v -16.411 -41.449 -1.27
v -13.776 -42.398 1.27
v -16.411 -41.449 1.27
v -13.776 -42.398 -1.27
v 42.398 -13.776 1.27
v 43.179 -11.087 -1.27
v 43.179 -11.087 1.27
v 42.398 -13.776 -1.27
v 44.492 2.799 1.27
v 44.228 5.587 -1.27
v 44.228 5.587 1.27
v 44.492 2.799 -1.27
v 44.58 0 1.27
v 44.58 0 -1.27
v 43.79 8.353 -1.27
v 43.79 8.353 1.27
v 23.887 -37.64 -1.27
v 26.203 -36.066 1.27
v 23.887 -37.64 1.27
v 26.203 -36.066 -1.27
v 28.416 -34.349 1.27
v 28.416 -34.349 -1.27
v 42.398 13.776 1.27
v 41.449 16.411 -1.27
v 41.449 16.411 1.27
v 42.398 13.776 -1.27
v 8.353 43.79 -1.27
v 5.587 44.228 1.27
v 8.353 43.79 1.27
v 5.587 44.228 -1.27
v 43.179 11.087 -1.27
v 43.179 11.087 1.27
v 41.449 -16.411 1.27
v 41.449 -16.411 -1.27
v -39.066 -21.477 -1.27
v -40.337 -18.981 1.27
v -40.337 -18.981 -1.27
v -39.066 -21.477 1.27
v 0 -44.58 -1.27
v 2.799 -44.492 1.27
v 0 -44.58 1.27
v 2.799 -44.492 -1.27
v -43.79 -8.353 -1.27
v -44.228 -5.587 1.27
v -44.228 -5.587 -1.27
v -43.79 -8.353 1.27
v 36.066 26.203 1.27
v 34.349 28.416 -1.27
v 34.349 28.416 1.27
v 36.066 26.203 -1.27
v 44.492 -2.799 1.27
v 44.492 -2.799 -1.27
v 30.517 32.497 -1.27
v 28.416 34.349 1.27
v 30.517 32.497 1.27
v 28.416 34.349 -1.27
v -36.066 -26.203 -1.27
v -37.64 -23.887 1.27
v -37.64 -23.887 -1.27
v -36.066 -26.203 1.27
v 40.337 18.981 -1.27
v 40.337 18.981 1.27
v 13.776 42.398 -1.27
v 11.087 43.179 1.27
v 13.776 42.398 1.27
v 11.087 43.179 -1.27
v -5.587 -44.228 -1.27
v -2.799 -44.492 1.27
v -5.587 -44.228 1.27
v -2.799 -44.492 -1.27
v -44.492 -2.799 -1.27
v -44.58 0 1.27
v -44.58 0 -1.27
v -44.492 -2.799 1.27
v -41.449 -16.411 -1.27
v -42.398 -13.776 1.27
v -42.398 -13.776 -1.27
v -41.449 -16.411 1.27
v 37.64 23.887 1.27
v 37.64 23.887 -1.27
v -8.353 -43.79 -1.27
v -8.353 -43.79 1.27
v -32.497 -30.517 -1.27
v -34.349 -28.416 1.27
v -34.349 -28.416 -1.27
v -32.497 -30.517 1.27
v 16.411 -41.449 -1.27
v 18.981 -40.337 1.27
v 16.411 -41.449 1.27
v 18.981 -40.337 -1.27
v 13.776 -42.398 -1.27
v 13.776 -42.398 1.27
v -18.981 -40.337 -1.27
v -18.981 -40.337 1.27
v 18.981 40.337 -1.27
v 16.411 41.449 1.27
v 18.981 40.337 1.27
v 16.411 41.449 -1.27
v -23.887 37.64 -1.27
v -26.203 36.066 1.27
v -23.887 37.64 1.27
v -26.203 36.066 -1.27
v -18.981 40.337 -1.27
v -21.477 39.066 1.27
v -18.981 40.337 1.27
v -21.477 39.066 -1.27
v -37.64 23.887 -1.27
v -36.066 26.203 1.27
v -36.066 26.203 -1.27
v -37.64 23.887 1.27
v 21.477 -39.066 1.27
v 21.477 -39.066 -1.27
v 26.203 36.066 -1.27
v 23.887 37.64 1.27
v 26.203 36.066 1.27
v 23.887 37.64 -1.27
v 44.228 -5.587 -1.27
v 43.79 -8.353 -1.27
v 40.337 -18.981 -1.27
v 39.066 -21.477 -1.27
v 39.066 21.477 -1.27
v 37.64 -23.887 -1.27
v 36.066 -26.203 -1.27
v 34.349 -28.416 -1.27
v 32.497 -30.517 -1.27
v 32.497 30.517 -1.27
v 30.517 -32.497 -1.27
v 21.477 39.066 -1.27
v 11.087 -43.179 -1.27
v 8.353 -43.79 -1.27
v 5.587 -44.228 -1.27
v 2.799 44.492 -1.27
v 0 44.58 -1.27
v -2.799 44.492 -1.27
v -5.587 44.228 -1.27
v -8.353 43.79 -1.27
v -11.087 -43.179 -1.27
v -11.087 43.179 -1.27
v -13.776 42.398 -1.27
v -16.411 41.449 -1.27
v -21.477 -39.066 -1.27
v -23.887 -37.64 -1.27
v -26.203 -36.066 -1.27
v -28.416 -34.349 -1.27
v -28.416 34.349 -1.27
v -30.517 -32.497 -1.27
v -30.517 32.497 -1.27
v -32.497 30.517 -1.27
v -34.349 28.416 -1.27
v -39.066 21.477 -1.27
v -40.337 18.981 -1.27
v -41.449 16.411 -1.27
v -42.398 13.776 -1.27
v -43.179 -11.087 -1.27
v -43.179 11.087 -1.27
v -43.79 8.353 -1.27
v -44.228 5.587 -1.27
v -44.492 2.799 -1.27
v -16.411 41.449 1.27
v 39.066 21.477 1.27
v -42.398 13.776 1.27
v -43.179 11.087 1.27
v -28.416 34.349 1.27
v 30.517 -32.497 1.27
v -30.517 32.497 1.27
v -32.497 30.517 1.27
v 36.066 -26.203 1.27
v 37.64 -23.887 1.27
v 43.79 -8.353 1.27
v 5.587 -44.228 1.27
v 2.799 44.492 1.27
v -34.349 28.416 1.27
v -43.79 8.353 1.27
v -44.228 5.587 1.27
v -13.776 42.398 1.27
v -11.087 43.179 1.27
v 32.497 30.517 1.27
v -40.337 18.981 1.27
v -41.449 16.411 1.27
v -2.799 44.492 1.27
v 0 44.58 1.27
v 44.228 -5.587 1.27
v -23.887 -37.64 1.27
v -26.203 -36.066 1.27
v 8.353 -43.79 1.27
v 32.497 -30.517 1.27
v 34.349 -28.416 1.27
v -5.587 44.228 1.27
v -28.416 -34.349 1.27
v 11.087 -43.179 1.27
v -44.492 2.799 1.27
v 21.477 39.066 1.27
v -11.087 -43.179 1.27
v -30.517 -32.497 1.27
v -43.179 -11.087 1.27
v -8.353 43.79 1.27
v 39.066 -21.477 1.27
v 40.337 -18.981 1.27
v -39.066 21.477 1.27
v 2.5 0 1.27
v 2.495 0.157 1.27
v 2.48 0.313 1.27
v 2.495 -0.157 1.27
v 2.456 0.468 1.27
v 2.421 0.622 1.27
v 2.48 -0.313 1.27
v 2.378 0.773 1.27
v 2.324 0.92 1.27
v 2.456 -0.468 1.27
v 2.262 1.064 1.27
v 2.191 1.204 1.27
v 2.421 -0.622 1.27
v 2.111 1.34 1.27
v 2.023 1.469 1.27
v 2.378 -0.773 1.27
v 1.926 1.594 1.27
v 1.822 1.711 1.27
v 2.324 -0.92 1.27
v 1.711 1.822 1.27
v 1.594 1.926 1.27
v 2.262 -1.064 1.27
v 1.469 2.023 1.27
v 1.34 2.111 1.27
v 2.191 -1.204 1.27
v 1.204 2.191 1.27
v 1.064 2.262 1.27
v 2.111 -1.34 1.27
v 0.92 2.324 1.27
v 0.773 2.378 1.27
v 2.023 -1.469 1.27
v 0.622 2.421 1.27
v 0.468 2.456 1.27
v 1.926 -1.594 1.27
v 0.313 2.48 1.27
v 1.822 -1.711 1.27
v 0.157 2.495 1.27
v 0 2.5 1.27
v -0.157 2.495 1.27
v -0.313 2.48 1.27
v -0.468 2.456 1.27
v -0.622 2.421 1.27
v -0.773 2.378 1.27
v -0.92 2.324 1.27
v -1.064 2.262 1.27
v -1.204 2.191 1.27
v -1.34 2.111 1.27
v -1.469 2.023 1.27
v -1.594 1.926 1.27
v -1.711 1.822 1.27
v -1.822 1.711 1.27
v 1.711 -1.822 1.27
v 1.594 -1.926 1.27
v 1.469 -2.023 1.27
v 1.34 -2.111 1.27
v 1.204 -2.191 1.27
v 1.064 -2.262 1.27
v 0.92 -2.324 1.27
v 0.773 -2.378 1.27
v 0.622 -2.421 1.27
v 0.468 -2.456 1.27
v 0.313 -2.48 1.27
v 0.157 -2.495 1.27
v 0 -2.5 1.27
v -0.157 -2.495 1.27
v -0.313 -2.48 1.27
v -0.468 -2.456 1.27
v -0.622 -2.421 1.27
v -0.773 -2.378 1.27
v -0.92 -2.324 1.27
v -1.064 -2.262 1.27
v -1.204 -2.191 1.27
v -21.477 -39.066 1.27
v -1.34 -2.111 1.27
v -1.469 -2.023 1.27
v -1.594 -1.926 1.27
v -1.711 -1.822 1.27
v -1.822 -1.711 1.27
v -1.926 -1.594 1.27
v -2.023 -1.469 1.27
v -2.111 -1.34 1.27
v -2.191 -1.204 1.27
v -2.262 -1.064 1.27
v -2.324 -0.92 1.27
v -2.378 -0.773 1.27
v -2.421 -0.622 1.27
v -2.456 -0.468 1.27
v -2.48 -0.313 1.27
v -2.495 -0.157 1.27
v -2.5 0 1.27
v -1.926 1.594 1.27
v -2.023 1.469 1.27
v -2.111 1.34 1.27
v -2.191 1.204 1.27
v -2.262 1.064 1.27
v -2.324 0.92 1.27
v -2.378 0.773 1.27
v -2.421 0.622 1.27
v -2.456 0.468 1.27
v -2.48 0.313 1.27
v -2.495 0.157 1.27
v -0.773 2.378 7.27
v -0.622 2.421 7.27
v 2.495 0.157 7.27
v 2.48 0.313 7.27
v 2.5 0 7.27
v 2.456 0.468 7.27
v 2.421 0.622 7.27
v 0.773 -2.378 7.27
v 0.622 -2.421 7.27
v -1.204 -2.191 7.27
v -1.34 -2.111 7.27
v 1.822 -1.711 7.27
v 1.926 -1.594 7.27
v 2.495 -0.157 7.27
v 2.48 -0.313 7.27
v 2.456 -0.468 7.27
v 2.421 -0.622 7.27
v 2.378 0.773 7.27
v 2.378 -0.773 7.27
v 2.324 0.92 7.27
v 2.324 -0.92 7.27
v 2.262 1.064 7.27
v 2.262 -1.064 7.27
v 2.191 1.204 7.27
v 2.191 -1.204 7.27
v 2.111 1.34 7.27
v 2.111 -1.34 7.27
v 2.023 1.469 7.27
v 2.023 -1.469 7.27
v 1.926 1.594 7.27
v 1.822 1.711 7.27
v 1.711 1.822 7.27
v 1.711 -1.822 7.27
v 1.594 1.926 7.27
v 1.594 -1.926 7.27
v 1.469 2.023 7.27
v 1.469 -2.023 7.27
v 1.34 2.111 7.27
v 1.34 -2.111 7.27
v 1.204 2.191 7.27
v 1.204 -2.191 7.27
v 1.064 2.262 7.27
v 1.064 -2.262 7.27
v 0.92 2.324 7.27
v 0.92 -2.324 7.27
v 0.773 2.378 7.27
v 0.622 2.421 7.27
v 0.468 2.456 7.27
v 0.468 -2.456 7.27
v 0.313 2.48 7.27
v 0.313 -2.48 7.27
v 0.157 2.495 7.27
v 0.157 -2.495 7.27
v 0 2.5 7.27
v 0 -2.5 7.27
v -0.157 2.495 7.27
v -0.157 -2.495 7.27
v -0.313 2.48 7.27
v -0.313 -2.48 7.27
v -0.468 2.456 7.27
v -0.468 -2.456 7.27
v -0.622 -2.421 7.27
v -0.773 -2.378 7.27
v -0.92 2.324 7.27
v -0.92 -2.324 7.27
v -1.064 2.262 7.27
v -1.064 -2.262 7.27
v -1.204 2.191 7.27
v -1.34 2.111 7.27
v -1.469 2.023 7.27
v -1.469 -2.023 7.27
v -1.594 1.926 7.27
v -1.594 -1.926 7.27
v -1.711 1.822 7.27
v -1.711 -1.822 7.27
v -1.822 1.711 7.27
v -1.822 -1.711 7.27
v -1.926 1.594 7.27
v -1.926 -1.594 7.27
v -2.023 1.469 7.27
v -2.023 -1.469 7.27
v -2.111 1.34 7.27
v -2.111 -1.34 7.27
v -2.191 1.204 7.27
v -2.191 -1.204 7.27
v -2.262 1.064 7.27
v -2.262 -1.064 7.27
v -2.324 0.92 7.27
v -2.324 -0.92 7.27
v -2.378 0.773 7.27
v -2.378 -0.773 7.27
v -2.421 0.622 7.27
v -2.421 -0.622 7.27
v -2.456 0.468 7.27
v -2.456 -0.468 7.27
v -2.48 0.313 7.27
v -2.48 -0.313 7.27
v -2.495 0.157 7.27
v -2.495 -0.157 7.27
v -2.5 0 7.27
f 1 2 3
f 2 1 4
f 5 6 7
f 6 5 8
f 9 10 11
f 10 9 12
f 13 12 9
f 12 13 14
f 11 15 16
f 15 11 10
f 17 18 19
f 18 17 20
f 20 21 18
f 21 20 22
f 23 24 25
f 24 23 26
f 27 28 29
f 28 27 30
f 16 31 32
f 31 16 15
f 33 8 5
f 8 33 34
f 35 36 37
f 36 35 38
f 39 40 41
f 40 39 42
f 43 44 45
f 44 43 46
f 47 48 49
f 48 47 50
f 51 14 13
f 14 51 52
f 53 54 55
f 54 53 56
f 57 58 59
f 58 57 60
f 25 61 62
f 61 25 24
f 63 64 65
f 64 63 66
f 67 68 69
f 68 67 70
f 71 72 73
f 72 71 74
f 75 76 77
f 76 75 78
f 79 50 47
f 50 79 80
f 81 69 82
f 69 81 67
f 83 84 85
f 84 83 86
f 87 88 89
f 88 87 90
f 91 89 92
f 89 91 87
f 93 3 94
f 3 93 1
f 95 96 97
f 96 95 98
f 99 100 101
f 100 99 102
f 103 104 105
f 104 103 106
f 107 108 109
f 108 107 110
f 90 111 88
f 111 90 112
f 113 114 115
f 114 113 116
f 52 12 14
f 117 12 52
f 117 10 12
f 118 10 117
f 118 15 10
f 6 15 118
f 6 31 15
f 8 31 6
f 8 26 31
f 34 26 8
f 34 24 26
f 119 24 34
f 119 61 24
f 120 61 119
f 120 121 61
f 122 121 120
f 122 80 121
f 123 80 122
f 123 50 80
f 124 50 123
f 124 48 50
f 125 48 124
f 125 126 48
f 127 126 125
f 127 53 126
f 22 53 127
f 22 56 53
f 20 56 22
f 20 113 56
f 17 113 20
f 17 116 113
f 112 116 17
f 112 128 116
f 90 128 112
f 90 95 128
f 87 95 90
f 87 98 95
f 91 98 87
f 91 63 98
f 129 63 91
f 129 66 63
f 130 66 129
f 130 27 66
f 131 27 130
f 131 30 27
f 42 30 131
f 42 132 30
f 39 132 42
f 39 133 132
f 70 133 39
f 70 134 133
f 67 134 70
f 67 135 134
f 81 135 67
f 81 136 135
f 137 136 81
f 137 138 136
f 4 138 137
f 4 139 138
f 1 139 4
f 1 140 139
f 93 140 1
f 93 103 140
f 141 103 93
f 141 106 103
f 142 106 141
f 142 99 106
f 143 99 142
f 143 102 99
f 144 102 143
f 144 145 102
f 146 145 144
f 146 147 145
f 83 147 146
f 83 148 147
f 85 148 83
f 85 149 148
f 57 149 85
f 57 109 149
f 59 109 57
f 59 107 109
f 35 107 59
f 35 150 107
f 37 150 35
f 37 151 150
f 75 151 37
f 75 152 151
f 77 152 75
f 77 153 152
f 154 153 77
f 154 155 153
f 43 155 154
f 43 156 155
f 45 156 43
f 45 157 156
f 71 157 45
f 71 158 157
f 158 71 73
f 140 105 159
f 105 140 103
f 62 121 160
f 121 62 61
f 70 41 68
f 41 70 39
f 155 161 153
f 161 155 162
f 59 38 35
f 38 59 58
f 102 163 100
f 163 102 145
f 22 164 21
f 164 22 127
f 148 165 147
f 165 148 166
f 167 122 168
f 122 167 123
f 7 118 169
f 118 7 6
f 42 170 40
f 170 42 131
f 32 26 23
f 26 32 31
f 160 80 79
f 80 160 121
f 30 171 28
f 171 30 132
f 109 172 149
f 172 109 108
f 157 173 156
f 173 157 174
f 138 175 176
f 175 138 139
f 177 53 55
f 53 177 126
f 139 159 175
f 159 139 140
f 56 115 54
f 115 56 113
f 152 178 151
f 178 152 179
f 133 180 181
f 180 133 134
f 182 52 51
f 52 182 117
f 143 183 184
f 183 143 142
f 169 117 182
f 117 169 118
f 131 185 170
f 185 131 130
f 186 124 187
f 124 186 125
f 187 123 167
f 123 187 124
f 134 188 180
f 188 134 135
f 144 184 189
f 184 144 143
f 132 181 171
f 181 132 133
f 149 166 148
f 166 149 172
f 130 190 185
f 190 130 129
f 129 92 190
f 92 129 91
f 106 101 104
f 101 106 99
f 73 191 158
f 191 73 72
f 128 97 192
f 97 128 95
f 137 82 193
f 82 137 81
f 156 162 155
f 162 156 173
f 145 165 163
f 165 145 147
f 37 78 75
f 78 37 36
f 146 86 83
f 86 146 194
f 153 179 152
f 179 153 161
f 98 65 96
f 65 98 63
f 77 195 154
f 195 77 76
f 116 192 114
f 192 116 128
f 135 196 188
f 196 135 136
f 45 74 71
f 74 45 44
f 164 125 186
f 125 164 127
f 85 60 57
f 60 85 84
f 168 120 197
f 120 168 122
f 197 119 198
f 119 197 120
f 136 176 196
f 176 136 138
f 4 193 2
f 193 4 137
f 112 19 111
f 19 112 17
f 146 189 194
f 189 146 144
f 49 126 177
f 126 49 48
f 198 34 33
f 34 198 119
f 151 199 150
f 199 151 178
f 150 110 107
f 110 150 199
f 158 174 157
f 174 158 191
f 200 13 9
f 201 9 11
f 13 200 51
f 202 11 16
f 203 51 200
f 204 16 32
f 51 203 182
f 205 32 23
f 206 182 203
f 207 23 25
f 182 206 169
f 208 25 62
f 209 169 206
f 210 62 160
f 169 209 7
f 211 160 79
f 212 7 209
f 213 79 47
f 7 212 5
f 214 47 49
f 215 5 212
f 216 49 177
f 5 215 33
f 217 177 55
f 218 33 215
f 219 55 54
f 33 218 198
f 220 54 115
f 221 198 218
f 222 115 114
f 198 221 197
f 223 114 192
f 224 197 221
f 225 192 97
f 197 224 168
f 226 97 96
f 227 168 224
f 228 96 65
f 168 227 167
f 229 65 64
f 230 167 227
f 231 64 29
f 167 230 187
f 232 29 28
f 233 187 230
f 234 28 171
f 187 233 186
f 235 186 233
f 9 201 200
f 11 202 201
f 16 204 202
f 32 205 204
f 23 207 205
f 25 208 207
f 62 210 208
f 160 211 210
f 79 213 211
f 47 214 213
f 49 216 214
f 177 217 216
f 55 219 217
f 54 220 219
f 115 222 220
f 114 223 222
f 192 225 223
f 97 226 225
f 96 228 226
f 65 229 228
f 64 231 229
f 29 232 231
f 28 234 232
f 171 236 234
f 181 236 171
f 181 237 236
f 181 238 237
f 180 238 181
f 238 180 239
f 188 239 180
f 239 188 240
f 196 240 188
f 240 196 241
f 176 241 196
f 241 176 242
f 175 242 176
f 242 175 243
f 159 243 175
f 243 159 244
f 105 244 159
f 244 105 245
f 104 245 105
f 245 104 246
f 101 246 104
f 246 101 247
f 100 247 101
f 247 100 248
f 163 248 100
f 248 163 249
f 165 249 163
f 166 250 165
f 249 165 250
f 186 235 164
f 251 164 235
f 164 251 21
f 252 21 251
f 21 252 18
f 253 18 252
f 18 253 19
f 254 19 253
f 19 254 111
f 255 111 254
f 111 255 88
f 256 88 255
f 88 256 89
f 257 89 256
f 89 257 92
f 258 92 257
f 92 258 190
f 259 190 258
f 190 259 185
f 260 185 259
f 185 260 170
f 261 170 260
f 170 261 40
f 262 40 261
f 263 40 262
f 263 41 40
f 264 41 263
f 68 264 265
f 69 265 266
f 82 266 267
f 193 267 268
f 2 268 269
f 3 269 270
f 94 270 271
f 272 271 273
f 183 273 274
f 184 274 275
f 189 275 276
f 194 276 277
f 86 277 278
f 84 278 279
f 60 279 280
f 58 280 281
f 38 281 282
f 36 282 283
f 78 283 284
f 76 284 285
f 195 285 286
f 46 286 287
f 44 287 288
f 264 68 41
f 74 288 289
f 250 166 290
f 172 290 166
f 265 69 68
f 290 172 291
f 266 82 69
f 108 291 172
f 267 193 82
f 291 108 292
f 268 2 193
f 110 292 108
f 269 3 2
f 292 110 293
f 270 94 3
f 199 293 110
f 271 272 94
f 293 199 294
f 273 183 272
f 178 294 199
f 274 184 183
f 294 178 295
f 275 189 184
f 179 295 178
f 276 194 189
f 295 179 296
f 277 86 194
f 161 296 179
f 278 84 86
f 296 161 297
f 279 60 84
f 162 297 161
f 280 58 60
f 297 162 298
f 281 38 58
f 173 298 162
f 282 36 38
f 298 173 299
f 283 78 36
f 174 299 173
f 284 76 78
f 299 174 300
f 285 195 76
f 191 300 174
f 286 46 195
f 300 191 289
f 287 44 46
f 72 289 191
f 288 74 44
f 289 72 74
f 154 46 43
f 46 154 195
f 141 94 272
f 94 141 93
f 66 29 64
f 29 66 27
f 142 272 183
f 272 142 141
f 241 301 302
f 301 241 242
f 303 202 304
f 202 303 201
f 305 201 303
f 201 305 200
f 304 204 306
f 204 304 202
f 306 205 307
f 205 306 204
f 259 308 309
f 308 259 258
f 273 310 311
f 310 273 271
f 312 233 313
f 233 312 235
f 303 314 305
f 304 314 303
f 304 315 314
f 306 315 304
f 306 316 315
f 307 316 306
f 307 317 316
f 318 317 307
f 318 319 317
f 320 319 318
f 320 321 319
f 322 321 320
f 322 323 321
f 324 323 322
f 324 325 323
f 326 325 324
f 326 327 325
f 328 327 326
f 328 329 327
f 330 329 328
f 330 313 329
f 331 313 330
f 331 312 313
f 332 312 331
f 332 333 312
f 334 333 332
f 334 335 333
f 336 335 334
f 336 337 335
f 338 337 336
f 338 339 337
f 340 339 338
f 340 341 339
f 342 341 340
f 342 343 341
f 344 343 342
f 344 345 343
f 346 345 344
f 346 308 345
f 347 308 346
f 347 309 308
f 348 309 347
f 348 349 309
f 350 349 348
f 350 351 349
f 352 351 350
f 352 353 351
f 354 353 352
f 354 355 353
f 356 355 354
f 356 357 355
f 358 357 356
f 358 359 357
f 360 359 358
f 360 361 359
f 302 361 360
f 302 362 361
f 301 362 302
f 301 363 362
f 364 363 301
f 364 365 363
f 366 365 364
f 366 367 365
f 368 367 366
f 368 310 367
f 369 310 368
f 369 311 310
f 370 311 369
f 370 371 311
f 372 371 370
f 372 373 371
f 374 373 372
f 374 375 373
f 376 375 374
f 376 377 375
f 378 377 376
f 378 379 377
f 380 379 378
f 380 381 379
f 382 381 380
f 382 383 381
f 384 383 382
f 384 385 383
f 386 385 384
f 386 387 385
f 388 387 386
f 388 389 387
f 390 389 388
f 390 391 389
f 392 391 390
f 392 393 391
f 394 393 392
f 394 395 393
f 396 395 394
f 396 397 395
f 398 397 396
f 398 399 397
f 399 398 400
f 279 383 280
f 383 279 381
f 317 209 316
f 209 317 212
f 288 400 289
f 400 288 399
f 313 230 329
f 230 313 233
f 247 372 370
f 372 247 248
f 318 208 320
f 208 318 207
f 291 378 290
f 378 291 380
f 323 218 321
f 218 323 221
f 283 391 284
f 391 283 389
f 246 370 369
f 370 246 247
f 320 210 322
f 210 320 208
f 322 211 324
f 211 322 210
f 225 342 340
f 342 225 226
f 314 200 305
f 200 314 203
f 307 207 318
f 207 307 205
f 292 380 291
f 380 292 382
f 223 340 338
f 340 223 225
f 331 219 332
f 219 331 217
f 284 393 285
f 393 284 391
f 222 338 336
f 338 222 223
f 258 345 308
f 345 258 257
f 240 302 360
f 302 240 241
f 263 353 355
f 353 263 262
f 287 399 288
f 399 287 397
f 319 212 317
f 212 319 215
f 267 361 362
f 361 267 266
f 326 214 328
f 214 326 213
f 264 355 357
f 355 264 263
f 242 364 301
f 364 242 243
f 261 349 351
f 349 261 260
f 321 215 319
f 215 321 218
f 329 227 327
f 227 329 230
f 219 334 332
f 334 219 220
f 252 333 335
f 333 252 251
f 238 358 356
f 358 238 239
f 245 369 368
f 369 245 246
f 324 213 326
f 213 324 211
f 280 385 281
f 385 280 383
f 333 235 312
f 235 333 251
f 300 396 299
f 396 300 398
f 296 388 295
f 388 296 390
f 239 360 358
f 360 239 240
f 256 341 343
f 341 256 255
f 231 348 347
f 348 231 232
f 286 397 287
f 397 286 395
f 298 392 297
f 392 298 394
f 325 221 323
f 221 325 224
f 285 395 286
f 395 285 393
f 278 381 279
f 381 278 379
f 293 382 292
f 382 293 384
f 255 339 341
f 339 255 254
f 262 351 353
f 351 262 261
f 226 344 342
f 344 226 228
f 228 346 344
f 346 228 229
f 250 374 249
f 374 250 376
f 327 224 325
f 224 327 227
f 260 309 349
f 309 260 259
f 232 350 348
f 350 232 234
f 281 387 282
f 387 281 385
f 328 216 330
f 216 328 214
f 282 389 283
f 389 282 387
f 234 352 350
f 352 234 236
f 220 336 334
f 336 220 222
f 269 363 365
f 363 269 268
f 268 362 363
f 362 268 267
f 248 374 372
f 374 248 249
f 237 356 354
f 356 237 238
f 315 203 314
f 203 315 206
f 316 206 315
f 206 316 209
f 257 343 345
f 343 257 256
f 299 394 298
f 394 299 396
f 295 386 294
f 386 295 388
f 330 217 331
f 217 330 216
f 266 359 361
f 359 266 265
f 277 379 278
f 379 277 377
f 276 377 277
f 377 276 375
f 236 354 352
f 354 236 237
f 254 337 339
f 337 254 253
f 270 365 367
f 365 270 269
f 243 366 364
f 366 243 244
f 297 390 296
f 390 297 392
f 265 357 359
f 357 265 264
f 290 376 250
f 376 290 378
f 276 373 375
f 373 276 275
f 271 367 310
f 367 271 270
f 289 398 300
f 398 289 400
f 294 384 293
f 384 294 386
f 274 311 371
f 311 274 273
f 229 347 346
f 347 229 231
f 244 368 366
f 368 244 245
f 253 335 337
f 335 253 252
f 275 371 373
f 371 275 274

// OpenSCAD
// file: dim1.scad
//L'objet de ce fichier est de consigner les dimensions et les contraintes communes aux trois pieces de la e-poignee.
//Ces trois pieces sont fabriquees sur imprimante 3D, elles sont completees d'un Circuit Imprime (CI) et d'un isolateur.
//Le montage de l'ensemble est realise à l'aide d'un jeu de visserie compose
//de vis, de rondelles, d'un ecrou autobloquant et d'entretoises filetees.
//Les noms attribues a ces trois pieces sont la jupe, le top et le logo.
//Les dimensions relatives au CI sont exprimees en pouces et converties en mm à l'aide d'un Coefficient de Conversion (CC).
CC=25.4;//Coefficient de Conversion (pouce -> mm)
L1=1.6*CC;//longueur du CI
L2=1.3*CC;//entre axes des trous de fixation du CI
l1=1.2*CC;//largeur du CI
l2=0.9*CC;//entre axes des trous de fixation du CI
r=(0.125*CC)/2;//rayon de percage des trous de fixation du CI
e=0.1*CC;//epaisseur des parois
R=37.15;//Rayon du cercle de revolution du tore
//La premiere contrainte commune au logo et au top est la visibilite de l'embase USB.
//Cette visibilite est necessaire quand l'utilisateur etablit la connection du cable sur l'embase USB.
//La seconde contrainte est thermique, la temperature du couvercle peut atteindre des valeurs aux environ des 90°C.
//L'experience a montree que la matiere (PLA ou ABS) ramolie a ces temperatures.
//Cette contrainte est prise en compte par l'insertion de l'isolateur, elle concerne egalement la perimetre inferieur de la jupe.
// main file
include <dim1.scad>
$fn=100;
cylinder(h = e, r = 1.2*R, center = true);
translate([0,0,(e/2)+3])cylinder(h = 6, r = 2.5, center = true);
